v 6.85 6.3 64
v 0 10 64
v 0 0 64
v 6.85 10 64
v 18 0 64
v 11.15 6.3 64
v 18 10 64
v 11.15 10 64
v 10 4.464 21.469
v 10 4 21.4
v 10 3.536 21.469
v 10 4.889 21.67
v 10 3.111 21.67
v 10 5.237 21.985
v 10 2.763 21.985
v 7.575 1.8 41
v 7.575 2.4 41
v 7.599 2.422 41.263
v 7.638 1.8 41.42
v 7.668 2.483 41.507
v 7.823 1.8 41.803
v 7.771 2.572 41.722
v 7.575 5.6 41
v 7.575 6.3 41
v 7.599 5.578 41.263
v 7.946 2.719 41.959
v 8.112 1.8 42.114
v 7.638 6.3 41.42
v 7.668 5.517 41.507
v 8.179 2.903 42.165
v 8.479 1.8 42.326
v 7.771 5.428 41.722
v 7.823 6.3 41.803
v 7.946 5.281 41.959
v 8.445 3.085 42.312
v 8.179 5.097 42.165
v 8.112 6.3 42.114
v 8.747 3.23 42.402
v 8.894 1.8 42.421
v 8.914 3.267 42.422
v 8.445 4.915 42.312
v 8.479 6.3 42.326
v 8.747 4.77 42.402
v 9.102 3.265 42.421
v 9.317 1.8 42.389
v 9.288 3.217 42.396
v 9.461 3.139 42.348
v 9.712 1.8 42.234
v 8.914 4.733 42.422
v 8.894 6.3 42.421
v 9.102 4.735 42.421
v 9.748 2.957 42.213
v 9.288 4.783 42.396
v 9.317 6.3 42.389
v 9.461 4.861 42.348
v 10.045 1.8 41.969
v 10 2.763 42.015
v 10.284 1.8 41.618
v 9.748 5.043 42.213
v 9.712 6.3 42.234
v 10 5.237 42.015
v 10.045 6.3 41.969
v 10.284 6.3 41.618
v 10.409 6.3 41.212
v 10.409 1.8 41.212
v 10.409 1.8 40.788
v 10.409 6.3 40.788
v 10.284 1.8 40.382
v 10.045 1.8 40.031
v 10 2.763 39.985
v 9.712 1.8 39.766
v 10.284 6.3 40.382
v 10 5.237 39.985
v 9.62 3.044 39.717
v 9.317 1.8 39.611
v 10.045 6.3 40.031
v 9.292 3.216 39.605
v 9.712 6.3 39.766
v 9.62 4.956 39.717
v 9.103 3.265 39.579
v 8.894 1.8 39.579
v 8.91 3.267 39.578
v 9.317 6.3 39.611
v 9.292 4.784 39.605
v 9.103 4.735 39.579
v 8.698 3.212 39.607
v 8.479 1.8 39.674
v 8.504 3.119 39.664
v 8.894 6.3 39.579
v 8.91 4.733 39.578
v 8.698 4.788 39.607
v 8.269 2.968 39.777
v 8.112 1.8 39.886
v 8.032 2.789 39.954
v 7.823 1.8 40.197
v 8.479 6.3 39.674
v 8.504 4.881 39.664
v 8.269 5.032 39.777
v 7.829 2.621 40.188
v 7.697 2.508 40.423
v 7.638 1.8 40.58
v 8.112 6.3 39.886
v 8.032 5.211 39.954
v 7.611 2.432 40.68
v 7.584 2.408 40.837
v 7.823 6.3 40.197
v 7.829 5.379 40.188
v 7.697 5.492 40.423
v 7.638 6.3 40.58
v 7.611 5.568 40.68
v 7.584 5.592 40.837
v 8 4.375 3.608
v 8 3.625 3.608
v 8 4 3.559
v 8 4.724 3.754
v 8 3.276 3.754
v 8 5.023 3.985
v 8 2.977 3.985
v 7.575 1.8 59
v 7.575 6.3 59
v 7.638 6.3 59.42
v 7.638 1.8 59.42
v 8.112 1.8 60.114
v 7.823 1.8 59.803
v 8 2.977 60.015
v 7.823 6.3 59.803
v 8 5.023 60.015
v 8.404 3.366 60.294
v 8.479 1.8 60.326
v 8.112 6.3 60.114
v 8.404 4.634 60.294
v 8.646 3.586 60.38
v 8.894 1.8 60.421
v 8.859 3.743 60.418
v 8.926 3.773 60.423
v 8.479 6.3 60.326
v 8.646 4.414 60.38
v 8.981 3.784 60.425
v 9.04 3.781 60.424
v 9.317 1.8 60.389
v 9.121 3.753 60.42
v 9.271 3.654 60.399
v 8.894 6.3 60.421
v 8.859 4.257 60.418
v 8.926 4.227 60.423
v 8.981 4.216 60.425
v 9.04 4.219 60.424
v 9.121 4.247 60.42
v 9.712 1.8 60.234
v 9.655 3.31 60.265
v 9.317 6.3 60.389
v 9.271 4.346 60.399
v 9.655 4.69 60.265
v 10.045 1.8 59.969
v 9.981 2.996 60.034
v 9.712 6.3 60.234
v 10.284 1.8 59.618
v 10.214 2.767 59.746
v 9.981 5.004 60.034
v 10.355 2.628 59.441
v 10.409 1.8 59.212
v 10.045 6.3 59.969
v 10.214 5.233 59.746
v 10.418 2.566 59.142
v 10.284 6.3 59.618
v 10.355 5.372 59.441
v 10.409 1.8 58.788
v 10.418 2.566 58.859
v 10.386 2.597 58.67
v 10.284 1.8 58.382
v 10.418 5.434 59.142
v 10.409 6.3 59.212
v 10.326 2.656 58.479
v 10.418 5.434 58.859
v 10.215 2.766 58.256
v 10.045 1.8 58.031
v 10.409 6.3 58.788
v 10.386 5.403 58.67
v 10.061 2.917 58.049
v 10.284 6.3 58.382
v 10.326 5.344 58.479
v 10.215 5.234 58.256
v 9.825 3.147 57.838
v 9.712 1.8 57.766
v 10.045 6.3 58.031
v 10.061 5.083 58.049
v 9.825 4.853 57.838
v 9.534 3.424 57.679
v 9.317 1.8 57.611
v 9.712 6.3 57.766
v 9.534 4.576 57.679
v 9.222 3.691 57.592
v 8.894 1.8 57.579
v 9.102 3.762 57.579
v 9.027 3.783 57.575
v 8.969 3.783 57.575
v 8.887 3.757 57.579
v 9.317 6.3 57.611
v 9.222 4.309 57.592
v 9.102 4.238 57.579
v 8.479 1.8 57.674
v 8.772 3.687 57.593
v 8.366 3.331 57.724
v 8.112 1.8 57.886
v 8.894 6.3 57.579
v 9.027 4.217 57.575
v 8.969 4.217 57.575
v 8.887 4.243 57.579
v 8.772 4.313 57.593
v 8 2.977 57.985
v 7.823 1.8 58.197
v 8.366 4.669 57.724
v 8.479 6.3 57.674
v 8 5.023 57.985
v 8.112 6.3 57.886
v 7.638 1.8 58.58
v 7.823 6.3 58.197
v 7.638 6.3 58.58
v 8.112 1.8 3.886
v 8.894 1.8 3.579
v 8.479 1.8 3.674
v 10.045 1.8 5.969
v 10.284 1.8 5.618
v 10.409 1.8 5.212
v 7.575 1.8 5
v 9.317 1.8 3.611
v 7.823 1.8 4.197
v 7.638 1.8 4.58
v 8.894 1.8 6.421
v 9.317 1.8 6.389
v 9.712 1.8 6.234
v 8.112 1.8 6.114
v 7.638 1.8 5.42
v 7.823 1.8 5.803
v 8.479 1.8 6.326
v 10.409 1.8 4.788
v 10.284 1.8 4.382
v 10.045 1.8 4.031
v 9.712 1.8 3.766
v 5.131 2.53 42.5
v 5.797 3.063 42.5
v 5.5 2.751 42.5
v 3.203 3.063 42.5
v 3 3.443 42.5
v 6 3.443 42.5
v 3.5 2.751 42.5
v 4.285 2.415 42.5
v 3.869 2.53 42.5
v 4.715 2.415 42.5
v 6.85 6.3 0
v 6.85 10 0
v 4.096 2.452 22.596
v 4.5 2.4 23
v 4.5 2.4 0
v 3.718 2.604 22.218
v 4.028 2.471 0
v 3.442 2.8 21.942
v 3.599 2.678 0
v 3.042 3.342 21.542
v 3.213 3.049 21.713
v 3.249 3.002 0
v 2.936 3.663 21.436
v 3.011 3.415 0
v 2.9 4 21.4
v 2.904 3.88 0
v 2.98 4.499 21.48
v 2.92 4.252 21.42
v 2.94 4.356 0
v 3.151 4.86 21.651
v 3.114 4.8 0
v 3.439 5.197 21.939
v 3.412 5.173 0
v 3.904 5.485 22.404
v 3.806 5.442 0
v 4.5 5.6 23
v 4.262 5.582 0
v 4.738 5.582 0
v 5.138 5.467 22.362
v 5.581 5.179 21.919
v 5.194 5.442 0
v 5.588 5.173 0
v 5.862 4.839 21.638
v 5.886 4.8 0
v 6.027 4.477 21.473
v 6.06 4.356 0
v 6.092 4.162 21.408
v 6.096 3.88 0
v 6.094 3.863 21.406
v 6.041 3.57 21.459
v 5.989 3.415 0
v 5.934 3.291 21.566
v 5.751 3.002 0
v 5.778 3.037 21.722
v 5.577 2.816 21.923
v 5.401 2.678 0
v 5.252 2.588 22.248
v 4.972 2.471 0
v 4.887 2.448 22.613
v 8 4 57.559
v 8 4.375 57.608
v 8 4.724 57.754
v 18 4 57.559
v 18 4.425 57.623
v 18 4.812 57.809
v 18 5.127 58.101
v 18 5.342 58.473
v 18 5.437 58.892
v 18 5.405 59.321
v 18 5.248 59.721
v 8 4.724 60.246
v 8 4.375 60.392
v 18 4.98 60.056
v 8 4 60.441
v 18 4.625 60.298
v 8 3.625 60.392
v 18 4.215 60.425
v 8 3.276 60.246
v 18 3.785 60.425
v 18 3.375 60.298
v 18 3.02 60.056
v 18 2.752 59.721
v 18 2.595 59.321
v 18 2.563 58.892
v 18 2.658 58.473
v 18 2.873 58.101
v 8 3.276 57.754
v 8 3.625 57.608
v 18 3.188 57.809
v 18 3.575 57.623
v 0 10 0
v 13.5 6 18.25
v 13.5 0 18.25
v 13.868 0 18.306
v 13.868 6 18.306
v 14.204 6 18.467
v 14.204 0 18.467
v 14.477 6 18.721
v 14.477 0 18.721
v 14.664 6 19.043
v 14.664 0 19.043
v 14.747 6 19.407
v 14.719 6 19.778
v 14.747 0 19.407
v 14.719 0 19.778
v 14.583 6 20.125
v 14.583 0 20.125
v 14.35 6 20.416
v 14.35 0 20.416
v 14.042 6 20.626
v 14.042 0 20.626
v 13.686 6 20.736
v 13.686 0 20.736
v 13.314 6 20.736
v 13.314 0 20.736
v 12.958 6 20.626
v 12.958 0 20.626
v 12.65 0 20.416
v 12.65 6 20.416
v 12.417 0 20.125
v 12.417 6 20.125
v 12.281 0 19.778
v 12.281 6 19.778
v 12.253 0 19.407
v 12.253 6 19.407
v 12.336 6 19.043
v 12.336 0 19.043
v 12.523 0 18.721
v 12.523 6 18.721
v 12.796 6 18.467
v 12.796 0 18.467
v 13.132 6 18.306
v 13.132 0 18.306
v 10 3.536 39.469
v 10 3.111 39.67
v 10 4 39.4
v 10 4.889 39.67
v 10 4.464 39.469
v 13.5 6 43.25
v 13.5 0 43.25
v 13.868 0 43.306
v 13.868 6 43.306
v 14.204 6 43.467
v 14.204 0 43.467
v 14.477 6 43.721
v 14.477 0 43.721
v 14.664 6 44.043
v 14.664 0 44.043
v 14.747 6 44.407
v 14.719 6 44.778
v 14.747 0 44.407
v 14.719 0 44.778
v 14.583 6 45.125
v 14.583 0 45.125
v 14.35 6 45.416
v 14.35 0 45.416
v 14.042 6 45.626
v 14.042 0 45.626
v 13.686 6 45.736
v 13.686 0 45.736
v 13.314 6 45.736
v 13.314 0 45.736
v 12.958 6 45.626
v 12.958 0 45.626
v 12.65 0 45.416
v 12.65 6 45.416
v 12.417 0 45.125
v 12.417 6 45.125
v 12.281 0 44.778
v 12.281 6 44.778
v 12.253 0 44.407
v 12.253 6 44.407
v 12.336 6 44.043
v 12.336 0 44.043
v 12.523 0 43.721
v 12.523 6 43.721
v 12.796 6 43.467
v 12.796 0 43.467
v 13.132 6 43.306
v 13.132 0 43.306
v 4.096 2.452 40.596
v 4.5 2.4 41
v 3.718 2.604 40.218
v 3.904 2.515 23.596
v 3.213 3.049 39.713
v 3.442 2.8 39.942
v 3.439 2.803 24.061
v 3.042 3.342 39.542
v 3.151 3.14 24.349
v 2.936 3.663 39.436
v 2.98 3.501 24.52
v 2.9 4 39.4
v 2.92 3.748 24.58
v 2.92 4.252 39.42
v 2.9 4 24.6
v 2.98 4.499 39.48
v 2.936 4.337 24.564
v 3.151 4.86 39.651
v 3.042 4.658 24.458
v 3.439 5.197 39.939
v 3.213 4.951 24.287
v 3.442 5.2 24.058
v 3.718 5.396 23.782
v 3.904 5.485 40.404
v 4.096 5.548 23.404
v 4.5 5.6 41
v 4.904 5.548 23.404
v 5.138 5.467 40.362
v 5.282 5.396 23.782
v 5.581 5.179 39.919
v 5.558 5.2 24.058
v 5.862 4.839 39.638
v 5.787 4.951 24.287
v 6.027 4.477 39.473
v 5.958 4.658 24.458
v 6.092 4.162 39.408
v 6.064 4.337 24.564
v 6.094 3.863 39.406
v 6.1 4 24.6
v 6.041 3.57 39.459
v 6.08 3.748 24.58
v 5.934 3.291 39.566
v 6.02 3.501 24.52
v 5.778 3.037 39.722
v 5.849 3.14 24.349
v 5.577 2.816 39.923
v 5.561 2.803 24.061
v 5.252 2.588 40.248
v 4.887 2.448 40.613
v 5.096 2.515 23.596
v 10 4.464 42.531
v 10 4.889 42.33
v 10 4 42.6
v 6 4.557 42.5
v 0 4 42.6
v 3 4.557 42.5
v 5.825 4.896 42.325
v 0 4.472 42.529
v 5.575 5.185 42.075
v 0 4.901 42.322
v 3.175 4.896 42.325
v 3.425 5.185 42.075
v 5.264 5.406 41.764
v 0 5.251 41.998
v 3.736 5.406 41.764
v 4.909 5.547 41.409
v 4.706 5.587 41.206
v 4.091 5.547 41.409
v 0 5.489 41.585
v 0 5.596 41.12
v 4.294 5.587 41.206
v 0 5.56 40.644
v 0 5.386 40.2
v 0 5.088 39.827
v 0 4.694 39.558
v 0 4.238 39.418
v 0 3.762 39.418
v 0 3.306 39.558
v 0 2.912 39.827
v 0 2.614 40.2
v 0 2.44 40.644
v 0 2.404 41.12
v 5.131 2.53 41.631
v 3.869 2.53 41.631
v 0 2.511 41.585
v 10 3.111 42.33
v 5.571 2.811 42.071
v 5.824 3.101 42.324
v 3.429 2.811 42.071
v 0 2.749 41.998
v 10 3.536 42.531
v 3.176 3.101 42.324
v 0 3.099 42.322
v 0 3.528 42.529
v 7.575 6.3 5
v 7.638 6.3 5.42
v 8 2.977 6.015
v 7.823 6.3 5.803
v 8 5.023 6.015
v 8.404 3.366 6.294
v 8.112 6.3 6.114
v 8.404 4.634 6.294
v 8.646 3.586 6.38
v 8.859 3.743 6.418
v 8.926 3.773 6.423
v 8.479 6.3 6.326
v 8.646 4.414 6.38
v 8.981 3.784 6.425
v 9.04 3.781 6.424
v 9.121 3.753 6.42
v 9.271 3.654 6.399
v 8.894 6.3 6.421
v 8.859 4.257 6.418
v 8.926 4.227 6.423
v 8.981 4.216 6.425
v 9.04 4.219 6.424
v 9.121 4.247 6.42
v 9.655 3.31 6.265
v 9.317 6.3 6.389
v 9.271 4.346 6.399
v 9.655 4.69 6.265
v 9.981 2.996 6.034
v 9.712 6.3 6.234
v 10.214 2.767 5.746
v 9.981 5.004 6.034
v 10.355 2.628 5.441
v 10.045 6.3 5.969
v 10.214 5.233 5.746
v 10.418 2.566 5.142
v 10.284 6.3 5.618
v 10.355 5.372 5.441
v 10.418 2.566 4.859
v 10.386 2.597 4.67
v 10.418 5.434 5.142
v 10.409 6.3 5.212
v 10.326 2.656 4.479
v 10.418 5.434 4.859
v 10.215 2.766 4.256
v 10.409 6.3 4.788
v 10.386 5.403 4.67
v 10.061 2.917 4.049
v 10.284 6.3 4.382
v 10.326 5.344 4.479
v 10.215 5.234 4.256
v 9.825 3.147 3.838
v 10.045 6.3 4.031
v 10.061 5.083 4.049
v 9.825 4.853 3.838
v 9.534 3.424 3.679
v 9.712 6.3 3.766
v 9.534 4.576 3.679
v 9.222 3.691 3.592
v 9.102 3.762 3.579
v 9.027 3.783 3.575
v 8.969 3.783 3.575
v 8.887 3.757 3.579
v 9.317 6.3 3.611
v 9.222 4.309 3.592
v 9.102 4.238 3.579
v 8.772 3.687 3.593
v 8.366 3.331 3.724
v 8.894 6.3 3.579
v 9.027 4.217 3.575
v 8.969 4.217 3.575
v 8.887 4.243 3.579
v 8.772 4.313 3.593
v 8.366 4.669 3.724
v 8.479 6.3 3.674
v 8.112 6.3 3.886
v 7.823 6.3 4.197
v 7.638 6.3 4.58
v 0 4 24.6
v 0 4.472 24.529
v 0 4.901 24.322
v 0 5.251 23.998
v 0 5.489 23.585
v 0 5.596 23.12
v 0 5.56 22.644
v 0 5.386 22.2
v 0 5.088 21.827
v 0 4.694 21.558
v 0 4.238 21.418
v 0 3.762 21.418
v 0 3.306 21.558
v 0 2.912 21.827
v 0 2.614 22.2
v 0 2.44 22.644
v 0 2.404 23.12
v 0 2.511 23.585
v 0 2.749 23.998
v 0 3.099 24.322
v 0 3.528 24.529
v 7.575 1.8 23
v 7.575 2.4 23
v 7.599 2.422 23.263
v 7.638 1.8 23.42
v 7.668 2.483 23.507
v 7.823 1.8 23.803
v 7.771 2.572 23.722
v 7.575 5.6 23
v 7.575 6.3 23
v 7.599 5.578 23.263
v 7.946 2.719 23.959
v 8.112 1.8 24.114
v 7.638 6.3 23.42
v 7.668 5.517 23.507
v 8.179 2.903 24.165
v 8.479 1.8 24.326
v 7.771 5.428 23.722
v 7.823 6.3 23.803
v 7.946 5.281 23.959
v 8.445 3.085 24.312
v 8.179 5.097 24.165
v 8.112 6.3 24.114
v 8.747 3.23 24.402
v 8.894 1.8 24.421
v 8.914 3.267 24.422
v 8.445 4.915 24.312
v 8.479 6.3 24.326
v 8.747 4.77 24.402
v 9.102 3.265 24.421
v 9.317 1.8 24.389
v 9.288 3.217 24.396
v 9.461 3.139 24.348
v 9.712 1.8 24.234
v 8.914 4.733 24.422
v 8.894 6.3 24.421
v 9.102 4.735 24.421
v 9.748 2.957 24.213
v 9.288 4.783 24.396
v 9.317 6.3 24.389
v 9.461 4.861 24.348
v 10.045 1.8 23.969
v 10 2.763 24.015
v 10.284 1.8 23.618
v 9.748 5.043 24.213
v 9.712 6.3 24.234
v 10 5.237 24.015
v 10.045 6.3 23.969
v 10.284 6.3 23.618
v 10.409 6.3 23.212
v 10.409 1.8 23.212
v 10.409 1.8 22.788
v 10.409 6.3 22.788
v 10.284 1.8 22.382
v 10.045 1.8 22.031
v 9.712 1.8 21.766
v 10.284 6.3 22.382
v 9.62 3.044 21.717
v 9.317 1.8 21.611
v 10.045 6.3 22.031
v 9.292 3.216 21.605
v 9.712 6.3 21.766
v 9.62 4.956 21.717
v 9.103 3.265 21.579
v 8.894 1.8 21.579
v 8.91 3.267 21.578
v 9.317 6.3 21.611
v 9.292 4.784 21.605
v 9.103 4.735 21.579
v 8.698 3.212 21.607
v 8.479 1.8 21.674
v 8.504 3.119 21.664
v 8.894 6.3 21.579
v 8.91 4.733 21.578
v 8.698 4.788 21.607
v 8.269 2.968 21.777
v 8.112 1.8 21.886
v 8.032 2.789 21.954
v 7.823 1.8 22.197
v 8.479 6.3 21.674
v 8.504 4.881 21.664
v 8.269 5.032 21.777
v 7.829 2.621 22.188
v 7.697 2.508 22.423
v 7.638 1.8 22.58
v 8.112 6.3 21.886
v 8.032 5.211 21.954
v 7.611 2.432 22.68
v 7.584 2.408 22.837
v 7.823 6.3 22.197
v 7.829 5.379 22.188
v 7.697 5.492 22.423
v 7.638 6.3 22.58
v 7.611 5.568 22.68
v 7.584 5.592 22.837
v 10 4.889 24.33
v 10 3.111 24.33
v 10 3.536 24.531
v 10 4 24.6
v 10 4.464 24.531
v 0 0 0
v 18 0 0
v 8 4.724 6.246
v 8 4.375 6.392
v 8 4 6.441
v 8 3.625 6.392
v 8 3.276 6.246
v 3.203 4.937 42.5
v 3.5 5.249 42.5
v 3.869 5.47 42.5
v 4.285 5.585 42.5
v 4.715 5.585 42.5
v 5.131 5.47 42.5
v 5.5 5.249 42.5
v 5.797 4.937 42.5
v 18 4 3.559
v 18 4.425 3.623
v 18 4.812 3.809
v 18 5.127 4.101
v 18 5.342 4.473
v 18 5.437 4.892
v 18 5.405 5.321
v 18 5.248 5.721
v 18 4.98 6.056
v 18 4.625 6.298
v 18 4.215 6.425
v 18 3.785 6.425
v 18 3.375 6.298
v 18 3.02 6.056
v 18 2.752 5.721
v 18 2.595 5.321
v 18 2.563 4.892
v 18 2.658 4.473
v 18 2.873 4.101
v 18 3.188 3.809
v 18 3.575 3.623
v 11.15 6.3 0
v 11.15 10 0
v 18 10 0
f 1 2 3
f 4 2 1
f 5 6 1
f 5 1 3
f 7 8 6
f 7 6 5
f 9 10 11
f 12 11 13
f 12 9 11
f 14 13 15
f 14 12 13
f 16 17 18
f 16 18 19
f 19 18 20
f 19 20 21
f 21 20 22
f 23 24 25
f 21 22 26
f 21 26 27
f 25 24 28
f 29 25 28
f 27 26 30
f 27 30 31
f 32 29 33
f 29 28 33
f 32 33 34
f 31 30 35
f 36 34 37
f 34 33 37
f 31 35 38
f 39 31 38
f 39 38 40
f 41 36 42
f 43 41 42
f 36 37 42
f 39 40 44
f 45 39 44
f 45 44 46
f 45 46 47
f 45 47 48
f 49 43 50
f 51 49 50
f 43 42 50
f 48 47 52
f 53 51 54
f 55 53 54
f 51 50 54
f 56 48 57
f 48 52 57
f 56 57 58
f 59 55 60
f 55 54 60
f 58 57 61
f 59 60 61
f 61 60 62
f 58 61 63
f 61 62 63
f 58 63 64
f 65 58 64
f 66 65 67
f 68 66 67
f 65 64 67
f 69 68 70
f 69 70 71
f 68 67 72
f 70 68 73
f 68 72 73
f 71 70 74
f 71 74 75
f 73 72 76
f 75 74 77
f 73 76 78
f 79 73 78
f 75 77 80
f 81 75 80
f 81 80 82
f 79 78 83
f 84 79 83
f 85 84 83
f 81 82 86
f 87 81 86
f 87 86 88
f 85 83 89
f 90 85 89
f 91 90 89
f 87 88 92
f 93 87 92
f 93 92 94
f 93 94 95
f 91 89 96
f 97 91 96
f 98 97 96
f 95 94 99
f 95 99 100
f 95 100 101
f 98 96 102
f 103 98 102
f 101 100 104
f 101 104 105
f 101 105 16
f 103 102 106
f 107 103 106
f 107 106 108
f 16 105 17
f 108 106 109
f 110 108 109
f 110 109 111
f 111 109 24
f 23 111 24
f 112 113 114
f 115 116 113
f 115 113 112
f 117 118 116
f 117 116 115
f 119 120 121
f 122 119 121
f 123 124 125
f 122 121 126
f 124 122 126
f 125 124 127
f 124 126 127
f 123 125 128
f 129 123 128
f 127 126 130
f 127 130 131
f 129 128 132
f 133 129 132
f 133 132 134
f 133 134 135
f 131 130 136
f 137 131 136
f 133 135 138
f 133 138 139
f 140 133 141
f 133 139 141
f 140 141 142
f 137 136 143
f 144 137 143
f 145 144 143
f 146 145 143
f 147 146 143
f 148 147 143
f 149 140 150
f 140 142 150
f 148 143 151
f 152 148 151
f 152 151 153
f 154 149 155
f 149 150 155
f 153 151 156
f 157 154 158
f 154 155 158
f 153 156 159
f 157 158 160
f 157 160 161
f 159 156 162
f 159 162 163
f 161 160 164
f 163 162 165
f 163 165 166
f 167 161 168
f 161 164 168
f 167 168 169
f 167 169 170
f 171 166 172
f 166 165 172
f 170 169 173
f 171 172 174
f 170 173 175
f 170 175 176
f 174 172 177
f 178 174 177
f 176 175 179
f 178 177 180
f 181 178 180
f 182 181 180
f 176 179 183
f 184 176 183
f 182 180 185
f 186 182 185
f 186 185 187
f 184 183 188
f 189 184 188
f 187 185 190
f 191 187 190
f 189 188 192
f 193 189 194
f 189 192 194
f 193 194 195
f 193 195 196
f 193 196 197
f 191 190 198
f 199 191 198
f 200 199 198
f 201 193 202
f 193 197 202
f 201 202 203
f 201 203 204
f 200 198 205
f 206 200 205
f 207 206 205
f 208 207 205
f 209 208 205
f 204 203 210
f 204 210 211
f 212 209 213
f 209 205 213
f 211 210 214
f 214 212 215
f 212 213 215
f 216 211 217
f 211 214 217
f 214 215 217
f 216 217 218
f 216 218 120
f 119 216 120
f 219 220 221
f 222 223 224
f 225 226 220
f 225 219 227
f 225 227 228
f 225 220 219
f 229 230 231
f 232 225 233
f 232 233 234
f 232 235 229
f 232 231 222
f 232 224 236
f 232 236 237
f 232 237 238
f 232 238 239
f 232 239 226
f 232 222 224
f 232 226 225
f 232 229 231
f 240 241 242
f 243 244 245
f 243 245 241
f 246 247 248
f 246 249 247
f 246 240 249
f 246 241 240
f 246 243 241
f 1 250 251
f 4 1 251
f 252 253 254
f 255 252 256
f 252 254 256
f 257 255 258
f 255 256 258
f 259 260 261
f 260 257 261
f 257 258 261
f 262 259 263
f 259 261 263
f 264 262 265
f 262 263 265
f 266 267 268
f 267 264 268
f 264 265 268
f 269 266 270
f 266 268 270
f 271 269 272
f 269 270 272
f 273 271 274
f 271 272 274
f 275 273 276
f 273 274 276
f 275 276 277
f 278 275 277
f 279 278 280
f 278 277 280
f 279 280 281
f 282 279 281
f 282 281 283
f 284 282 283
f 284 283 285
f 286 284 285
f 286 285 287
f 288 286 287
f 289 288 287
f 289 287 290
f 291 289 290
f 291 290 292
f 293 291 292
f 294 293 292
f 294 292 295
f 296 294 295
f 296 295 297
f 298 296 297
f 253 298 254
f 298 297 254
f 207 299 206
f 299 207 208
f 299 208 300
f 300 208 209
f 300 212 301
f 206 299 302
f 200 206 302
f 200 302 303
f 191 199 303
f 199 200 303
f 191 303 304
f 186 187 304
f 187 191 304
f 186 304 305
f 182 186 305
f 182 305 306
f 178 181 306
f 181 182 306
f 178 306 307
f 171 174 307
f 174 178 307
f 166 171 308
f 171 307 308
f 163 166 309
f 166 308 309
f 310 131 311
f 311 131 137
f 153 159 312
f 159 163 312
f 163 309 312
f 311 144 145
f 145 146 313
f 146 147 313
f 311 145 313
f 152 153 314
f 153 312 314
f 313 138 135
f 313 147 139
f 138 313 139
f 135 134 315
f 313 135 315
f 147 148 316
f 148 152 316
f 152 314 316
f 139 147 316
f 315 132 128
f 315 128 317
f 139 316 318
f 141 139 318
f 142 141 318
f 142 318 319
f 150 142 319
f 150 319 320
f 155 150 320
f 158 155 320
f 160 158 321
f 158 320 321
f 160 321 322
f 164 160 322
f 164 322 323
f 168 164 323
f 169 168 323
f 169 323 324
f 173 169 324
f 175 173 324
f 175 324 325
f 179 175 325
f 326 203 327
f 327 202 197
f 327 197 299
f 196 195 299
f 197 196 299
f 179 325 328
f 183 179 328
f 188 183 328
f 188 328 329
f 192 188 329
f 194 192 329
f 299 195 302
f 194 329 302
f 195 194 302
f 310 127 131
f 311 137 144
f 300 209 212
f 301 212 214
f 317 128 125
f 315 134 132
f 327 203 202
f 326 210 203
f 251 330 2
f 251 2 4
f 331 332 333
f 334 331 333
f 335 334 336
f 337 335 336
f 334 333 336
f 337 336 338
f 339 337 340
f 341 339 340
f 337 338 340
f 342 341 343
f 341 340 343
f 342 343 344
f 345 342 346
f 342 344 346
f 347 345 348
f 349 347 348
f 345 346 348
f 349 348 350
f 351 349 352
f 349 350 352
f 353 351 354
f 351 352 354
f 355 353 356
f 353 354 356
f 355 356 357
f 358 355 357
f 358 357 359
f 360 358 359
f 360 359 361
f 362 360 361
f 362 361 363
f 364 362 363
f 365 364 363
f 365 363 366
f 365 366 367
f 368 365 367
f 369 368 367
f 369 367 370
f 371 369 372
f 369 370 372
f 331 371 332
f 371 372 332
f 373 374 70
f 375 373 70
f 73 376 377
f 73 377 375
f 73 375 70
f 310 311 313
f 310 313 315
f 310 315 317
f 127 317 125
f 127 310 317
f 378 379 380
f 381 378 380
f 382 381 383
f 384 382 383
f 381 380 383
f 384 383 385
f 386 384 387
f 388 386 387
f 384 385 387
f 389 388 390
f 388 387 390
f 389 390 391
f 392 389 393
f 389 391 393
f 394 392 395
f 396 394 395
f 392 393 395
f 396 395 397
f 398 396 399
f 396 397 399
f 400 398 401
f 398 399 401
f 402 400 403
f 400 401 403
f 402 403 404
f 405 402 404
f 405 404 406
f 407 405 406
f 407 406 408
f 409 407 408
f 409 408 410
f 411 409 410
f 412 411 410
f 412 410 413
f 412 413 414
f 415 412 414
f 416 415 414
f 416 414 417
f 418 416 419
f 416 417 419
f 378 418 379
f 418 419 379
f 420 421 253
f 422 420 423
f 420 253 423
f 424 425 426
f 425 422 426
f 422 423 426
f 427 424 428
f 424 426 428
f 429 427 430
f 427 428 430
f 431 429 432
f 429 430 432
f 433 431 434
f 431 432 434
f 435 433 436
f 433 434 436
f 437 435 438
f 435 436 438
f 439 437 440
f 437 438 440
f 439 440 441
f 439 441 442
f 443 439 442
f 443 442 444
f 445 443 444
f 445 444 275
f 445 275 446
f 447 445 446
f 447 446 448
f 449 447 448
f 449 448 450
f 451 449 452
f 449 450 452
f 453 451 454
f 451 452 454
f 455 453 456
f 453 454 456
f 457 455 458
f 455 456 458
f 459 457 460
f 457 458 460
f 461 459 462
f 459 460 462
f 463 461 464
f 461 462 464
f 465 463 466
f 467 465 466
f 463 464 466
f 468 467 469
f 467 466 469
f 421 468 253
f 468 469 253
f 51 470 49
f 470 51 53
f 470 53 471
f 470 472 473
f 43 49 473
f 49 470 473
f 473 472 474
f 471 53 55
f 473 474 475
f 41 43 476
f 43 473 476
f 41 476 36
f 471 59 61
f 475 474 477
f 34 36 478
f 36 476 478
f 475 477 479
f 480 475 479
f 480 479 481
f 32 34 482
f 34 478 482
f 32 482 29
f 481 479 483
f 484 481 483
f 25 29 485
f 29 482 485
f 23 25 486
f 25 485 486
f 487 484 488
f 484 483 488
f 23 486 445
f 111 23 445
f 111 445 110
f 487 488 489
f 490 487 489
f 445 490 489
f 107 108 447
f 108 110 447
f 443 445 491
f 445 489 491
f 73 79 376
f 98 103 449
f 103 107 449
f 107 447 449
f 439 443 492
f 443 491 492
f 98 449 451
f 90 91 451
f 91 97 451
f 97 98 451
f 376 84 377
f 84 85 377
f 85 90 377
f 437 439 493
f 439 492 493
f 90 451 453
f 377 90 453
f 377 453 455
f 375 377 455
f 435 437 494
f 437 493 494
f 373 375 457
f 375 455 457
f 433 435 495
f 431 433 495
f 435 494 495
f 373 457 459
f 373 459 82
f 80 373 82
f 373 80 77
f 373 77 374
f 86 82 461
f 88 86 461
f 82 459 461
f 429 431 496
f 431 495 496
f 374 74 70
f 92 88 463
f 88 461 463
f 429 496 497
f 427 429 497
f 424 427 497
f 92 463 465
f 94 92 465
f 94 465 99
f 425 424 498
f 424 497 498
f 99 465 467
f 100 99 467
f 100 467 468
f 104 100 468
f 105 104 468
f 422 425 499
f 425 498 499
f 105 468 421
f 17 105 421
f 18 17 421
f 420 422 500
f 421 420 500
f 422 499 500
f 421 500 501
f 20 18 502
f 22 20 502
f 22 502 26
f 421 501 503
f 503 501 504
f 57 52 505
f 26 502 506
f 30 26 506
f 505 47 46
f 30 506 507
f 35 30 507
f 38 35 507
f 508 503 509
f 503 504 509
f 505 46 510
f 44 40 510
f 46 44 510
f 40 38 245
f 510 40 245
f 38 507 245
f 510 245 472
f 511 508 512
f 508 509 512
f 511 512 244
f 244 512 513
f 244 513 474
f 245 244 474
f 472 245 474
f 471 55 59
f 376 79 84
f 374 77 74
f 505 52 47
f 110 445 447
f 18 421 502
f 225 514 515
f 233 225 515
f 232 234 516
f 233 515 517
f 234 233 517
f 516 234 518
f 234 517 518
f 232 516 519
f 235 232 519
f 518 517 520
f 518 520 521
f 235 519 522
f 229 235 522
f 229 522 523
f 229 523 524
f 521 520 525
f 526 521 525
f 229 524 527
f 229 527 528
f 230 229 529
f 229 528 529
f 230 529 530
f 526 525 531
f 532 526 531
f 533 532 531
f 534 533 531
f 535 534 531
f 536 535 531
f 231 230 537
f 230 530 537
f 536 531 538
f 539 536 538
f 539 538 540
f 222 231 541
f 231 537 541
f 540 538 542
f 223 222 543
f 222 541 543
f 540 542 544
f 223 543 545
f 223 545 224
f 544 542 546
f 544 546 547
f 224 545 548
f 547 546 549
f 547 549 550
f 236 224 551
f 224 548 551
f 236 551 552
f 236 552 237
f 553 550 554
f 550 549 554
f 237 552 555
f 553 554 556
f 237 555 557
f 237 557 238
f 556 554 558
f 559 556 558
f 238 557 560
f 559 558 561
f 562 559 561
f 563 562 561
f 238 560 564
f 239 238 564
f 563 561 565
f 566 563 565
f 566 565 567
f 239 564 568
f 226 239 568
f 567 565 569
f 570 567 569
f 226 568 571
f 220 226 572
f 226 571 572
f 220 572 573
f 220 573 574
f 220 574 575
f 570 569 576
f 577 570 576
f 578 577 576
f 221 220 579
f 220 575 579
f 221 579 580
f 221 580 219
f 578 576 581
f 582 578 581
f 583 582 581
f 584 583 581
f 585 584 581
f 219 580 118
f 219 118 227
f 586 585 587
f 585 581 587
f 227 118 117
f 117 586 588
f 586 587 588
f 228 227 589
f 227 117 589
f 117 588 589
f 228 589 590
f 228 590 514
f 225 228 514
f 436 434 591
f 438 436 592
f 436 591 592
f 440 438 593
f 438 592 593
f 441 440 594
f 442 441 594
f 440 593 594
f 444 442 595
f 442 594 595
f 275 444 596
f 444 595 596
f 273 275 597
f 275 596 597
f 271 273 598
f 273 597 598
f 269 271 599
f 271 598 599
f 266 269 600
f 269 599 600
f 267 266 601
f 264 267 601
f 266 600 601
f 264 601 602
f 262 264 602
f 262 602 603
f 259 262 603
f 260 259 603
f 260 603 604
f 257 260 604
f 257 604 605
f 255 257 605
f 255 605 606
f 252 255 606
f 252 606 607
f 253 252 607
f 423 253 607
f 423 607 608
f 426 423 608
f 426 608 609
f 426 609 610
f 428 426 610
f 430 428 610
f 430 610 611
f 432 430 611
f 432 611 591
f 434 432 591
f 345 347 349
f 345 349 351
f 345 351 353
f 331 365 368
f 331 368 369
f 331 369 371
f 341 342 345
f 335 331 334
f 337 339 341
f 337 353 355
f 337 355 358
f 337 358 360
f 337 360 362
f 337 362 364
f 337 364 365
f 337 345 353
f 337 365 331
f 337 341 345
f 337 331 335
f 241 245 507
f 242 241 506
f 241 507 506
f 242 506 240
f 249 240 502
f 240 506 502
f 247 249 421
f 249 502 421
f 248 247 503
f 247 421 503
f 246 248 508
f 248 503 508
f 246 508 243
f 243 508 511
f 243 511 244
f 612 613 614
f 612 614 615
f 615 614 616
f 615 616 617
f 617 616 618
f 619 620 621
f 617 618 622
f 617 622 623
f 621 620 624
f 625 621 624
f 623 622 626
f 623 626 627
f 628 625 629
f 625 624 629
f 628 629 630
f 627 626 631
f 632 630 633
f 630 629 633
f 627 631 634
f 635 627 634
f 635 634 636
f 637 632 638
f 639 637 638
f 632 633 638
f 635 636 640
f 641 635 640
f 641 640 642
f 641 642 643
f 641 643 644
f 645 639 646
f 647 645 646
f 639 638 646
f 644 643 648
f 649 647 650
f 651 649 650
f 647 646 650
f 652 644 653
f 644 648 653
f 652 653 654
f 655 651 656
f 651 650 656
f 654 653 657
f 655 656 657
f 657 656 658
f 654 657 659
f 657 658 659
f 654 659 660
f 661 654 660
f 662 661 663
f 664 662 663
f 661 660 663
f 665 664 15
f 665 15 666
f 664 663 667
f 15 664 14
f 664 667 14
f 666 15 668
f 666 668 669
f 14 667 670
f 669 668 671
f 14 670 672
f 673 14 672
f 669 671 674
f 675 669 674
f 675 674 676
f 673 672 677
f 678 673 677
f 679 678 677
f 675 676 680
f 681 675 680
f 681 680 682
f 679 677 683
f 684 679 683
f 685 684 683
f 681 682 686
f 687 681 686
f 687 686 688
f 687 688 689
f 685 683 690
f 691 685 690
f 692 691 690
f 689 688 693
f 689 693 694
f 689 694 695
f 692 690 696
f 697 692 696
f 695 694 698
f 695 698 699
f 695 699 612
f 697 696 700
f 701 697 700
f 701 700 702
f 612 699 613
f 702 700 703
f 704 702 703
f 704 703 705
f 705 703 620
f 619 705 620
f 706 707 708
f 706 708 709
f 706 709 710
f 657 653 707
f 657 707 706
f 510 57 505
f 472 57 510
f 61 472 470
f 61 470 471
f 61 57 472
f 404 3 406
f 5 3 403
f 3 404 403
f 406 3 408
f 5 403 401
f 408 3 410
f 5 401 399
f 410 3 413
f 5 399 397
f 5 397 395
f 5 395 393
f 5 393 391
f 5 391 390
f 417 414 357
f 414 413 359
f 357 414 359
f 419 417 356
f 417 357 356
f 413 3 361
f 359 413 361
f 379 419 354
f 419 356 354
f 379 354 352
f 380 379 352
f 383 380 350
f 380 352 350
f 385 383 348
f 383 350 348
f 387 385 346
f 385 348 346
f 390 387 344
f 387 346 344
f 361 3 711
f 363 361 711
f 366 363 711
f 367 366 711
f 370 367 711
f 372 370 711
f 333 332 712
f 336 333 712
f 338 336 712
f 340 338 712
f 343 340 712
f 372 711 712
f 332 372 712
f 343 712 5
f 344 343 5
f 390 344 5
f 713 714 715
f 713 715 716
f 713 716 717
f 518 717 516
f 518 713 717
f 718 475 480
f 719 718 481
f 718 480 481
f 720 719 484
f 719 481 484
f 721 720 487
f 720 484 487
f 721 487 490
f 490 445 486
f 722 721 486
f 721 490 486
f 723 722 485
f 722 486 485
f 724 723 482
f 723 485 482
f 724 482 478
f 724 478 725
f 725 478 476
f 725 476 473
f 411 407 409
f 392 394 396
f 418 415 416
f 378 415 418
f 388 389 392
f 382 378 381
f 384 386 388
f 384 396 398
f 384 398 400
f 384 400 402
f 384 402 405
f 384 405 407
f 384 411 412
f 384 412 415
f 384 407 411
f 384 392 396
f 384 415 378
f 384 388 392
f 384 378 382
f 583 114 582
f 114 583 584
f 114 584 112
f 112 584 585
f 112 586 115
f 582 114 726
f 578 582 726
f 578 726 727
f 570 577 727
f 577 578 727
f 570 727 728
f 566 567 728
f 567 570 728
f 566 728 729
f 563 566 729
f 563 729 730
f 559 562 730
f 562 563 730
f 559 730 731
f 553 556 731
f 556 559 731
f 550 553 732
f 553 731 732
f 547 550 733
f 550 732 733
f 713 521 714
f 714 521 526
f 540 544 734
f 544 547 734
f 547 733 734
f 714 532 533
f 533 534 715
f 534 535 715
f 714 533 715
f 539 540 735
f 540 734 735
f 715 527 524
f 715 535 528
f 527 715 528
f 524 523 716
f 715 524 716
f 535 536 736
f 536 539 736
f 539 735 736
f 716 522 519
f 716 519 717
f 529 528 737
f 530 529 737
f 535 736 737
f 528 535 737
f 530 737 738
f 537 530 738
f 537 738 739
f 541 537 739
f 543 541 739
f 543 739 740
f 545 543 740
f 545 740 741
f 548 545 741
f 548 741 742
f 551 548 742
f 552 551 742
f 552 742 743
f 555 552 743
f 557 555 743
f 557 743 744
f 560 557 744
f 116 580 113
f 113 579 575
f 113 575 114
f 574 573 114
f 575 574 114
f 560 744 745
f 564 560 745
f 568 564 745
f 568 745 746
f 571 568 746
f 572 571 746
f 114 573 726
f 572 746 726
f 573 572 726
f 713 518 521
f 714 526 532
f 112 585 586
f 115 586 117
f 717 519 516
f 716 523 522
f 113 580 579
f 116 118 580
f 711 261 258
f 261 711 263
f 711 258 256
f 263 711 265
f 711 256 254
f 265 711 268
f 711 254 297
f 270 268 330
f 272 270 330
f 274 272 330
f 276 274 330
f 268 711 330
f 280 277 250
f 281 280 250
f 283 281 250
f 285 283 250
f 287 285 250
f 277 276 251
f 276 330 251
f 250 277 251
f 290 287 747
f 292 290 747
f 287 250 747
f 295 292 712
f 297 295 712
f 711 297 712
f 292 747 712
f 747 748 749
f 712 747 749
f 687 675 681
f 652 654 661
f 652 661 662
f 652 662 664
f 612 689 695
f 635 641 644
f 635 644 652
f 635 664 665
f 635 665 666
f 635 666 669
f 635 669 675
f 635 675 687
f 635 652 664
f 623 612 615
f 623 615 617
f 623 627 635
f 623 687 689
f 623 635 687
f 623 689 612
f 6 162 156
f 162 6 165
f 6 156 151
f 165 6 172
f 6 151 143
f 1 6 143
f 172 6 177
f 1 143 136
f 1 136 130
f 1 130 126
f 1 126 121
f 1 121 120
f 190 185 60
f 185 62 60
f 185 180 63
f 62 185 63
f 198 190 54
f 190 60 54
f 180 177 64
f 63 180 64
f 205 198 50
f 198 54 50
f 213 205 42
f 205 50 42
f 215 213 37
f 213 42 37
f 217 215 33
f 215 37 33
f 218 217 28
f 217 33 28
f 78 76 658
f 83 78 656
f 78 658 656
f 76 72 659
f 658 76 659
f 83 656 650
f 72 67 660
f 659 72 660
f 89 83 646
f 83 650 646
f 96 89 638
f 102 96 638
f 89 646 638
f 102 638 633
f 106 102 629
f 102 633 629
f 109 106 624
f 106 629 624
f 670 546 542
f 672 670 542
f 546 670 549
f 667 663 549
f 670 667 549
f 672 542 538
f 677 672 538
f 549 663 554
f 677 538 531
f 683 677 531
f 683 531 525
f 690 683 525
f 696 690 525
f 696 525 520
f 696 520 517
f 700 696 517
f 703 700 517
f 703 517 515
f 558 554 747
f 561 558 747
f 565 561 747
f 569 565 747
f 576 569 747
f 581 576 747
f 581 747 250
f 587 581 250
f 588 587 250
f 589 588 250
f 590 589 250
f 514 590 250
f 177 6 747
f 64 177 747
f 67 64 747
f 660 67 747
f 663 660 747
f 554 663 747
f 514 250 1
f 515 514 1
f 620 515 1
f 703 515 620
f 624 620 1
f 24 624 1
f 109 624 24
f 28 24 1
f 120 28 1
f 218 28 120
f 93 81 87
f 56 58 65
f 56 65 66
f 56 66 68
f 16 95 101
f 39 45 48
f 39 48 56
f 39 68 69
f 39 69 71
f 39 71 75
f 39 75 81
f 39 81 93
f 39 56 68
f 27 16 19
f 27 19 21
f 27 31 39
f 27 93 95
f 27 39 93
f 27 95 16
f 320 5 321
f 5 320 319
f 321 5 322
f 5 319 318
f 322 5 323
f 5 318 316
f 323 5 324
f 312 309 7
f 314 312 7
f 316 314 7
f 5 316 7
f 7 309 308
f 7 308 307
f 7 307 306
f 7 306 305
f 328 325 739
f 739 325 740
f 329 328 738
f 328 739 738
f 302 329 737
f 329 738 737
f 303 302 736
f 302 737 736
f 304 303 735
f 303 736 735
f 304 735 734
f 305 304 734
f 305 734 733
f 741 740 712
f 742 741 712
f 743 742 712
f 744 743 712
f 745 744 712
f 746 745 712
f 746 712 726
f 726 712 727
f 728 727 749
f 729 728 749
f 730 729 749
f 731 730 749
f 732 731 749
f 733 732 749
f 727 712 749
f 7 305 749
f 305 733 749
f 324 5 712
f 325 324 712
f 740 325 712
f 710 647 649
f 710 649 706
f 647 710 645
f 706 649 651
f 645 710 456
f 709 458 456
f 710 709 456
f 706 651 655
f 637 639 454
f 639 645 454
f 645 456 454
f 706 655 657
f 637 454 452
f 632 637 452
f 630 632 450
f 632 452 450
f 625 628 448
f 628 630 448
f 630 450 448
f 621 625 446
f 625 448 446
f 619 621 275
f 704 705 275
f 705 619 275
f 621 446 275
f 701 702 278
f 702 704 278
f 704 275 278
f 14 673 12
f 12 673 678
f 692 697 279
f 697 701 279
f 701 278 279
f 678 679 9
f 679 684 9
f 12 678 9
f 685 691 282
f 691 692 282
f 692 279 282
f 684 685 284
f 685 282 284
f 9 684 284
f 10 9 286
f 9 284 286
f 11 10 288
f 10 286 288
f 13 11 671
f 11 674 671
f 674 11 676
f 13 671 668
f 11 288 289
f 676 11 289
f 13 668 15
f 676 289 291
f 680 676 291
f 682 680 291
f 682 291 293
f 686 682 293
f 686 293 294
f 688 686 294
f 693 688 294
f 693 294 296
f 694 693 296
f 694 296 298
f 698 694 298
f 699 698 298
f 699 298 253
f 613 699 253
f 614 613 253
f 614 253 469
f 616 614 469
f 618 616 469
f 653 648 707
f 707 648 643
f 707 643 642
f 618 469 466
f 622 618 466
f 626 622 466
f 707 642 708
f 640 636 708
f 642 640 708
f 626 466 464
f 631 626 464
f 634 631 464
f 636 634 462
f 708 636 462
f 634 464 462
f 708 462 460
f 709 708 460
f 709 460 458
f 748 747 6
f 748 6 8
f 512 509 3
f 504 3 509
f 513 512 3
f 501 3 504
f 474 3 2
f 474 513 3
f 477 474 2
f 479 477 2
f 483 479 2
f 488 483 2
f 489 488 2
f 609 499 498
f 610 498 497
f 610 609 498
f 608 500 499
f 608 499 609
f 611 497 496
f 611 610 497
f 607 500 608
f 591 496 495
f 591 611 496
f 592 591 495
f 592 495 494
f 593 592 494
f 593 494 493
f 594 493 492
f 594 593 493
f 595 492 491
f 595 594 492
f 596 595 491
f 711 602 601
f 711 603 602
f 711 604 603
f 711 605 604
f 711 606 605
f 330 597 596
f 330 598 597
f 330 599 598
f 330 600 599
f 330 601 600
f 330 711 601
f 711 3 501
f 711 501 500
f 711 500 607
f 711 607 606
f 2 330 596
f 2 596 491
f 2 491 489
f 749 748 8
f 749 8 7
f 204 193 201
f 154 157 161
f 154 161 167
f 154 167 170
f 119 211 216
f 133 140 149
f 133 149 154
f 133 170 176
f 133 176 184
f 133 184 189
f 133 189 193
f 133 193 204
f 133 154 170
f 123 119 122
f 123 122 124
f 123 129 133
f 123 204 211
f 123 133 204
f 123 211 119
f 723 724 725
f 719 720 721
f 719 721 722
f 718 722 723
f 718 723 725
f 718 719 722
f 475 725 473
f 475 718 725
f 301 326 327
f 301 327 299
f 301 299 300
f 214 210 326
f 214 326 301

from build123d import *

# Parameters (mm, degrees)
SKETCH1_W           = 18
SKETCH1_H           = 10
BOSS_EXTRUDE2_DEPTH = 64
CUT_EXTRUDE1_REACH  = 69.231
SKETCH3_W           = 4.3
SKETCH3_H           = 3.7
SKETCH5_R           = 1.425
CUT_EXTRUDE3_DEPTH  = 4.5
SKETCH7_R           = 1.44113796
CUT_EXTRUDE5_DEPTH  = 10
SKETCH8_R           = 1.6
CUT_EXTRUDE6_DEPTH  = 10
SKETCH9_R           = 1.6
CUT_EXTRUDE7_DEPTH  = 42.5
SKETCH10_R          = 1.25
CUT_EXTRUDE8_DEPTH  = 6


with BuildPart() as part:
    # Sketch1 → Boss-Extrude2 (new body)
    with BuildSketch(Plane.XY):
        with Locations((9, 5)):
            Rectangle(SKETCH1_W, SKETCH1_H)
    extrude(amount=BOSS_EXTRUDE2_DEPTH)

    # Sketch3 → Cut-Extrude1 (cut, up to next)
    with BuildSketch(Plane(origin=(0, 0, 0), x_dir=(-1, 0, 0), z_dir=(0, 0, -1)), mode=Mode.PRIVATE) as cut_extrude1_sk1:
        with Locations((-9, 8.15)):
            Rectangle(SKETCH3_W, SKETCH3_H)
    cut_extrude1_tool1 = extrude(cut_extrude1_sk1.sketch, amount=-CUT_EXTRUDE1_REACH, mode=Mode.PRIVATE) & part.part
    add(cut_extrude1_tool1.solids().sort_by_distance((9, 8.15, 0))[0], mode=Mode.SUBTRACT)

    # Sketch5 → Cut-Extrude3 (cut)
    with BuildSketch(Plane(origin=(0, 6.3, 0), x_dir=(1, 0, 0), z_dir=(0, 1, 0))):
        with Locations(Location((9, -23, 0), (0, 0, 180))):
            Circle(SKETCH5_R)
        with Locations(Location((9, -41, 0), (0, 0, 180))):
            Circle(SKETCH5_R)
        with Locations(Location((9, -5, 0), (0, 0, 180))):
            Circle(SKETCH5_R)
        with Locations(Location((9, -59, 0), (0, 0, 180))):
            Circle(SKETCH5_R)
    extrude(amount=-CUT_EXTRUDE3_DEPTH, mode=Mode.SUBTRACT)

    # Sketch7 → Cut-Extrude5 (cut)
    with BuildSketch(Plane(origin=(18, 0, 0), x_dir=(0, 0, -1), z_dir=(1, 0, 0))):
        with Locations((-5, 4)):
            Circle(SKETCH7_R)
        with Locations((-59, 4)):
            Circle(SKETCH7_R)
    extrude(amount=-CUT_EXTRUDE5_DEPTH, mode=Mode.SUBTRACT)

    # Sketch8 → Cut-Extrude6 (cut)
    with BuildSketch(Plane.ZY):
        with Locations((23, 4)):
            Circle(SKETCH8_R)
        with Locations((41, 4)):
            Circle(SKETCH8_R)
    extrude(amount=-CUT_EXTRUDE6_DEPTH, mode=Mode.SUBTRACT)

    # Sketch9 → Cut-Extrude7 (cut)
    with BuildSketch(Plane(origin=(0, 0, 0), x_dir=(-1, 0, 0), z_dir=(0, 0, -1))):
        with Locations(Location((-4.5, 4, 0), (0, 0, 270))):
            Circle(SKETCH9_R)
    extrude(amount=-CUT_EXTRUDE7_DEPTH, mode=Mode.SUBTRACT)

    # Sketch10 → Cut-Extrude8 (cut)
    with BuildSketch(Plane.XZ):
        with Locations(Location((13.5, 19.5, 0), (0, 0, 270))):
            Circle(SKETCH10_R)
        with Locations(Location((13.5, 44.5, 0), (0, 0, 270))):
            Circle(SKETCH10_R)
    extrude(amount=-CUT_EXTRUDE8_DEPTH, mode=Mode.SUBTRACT)


solid = part.part
